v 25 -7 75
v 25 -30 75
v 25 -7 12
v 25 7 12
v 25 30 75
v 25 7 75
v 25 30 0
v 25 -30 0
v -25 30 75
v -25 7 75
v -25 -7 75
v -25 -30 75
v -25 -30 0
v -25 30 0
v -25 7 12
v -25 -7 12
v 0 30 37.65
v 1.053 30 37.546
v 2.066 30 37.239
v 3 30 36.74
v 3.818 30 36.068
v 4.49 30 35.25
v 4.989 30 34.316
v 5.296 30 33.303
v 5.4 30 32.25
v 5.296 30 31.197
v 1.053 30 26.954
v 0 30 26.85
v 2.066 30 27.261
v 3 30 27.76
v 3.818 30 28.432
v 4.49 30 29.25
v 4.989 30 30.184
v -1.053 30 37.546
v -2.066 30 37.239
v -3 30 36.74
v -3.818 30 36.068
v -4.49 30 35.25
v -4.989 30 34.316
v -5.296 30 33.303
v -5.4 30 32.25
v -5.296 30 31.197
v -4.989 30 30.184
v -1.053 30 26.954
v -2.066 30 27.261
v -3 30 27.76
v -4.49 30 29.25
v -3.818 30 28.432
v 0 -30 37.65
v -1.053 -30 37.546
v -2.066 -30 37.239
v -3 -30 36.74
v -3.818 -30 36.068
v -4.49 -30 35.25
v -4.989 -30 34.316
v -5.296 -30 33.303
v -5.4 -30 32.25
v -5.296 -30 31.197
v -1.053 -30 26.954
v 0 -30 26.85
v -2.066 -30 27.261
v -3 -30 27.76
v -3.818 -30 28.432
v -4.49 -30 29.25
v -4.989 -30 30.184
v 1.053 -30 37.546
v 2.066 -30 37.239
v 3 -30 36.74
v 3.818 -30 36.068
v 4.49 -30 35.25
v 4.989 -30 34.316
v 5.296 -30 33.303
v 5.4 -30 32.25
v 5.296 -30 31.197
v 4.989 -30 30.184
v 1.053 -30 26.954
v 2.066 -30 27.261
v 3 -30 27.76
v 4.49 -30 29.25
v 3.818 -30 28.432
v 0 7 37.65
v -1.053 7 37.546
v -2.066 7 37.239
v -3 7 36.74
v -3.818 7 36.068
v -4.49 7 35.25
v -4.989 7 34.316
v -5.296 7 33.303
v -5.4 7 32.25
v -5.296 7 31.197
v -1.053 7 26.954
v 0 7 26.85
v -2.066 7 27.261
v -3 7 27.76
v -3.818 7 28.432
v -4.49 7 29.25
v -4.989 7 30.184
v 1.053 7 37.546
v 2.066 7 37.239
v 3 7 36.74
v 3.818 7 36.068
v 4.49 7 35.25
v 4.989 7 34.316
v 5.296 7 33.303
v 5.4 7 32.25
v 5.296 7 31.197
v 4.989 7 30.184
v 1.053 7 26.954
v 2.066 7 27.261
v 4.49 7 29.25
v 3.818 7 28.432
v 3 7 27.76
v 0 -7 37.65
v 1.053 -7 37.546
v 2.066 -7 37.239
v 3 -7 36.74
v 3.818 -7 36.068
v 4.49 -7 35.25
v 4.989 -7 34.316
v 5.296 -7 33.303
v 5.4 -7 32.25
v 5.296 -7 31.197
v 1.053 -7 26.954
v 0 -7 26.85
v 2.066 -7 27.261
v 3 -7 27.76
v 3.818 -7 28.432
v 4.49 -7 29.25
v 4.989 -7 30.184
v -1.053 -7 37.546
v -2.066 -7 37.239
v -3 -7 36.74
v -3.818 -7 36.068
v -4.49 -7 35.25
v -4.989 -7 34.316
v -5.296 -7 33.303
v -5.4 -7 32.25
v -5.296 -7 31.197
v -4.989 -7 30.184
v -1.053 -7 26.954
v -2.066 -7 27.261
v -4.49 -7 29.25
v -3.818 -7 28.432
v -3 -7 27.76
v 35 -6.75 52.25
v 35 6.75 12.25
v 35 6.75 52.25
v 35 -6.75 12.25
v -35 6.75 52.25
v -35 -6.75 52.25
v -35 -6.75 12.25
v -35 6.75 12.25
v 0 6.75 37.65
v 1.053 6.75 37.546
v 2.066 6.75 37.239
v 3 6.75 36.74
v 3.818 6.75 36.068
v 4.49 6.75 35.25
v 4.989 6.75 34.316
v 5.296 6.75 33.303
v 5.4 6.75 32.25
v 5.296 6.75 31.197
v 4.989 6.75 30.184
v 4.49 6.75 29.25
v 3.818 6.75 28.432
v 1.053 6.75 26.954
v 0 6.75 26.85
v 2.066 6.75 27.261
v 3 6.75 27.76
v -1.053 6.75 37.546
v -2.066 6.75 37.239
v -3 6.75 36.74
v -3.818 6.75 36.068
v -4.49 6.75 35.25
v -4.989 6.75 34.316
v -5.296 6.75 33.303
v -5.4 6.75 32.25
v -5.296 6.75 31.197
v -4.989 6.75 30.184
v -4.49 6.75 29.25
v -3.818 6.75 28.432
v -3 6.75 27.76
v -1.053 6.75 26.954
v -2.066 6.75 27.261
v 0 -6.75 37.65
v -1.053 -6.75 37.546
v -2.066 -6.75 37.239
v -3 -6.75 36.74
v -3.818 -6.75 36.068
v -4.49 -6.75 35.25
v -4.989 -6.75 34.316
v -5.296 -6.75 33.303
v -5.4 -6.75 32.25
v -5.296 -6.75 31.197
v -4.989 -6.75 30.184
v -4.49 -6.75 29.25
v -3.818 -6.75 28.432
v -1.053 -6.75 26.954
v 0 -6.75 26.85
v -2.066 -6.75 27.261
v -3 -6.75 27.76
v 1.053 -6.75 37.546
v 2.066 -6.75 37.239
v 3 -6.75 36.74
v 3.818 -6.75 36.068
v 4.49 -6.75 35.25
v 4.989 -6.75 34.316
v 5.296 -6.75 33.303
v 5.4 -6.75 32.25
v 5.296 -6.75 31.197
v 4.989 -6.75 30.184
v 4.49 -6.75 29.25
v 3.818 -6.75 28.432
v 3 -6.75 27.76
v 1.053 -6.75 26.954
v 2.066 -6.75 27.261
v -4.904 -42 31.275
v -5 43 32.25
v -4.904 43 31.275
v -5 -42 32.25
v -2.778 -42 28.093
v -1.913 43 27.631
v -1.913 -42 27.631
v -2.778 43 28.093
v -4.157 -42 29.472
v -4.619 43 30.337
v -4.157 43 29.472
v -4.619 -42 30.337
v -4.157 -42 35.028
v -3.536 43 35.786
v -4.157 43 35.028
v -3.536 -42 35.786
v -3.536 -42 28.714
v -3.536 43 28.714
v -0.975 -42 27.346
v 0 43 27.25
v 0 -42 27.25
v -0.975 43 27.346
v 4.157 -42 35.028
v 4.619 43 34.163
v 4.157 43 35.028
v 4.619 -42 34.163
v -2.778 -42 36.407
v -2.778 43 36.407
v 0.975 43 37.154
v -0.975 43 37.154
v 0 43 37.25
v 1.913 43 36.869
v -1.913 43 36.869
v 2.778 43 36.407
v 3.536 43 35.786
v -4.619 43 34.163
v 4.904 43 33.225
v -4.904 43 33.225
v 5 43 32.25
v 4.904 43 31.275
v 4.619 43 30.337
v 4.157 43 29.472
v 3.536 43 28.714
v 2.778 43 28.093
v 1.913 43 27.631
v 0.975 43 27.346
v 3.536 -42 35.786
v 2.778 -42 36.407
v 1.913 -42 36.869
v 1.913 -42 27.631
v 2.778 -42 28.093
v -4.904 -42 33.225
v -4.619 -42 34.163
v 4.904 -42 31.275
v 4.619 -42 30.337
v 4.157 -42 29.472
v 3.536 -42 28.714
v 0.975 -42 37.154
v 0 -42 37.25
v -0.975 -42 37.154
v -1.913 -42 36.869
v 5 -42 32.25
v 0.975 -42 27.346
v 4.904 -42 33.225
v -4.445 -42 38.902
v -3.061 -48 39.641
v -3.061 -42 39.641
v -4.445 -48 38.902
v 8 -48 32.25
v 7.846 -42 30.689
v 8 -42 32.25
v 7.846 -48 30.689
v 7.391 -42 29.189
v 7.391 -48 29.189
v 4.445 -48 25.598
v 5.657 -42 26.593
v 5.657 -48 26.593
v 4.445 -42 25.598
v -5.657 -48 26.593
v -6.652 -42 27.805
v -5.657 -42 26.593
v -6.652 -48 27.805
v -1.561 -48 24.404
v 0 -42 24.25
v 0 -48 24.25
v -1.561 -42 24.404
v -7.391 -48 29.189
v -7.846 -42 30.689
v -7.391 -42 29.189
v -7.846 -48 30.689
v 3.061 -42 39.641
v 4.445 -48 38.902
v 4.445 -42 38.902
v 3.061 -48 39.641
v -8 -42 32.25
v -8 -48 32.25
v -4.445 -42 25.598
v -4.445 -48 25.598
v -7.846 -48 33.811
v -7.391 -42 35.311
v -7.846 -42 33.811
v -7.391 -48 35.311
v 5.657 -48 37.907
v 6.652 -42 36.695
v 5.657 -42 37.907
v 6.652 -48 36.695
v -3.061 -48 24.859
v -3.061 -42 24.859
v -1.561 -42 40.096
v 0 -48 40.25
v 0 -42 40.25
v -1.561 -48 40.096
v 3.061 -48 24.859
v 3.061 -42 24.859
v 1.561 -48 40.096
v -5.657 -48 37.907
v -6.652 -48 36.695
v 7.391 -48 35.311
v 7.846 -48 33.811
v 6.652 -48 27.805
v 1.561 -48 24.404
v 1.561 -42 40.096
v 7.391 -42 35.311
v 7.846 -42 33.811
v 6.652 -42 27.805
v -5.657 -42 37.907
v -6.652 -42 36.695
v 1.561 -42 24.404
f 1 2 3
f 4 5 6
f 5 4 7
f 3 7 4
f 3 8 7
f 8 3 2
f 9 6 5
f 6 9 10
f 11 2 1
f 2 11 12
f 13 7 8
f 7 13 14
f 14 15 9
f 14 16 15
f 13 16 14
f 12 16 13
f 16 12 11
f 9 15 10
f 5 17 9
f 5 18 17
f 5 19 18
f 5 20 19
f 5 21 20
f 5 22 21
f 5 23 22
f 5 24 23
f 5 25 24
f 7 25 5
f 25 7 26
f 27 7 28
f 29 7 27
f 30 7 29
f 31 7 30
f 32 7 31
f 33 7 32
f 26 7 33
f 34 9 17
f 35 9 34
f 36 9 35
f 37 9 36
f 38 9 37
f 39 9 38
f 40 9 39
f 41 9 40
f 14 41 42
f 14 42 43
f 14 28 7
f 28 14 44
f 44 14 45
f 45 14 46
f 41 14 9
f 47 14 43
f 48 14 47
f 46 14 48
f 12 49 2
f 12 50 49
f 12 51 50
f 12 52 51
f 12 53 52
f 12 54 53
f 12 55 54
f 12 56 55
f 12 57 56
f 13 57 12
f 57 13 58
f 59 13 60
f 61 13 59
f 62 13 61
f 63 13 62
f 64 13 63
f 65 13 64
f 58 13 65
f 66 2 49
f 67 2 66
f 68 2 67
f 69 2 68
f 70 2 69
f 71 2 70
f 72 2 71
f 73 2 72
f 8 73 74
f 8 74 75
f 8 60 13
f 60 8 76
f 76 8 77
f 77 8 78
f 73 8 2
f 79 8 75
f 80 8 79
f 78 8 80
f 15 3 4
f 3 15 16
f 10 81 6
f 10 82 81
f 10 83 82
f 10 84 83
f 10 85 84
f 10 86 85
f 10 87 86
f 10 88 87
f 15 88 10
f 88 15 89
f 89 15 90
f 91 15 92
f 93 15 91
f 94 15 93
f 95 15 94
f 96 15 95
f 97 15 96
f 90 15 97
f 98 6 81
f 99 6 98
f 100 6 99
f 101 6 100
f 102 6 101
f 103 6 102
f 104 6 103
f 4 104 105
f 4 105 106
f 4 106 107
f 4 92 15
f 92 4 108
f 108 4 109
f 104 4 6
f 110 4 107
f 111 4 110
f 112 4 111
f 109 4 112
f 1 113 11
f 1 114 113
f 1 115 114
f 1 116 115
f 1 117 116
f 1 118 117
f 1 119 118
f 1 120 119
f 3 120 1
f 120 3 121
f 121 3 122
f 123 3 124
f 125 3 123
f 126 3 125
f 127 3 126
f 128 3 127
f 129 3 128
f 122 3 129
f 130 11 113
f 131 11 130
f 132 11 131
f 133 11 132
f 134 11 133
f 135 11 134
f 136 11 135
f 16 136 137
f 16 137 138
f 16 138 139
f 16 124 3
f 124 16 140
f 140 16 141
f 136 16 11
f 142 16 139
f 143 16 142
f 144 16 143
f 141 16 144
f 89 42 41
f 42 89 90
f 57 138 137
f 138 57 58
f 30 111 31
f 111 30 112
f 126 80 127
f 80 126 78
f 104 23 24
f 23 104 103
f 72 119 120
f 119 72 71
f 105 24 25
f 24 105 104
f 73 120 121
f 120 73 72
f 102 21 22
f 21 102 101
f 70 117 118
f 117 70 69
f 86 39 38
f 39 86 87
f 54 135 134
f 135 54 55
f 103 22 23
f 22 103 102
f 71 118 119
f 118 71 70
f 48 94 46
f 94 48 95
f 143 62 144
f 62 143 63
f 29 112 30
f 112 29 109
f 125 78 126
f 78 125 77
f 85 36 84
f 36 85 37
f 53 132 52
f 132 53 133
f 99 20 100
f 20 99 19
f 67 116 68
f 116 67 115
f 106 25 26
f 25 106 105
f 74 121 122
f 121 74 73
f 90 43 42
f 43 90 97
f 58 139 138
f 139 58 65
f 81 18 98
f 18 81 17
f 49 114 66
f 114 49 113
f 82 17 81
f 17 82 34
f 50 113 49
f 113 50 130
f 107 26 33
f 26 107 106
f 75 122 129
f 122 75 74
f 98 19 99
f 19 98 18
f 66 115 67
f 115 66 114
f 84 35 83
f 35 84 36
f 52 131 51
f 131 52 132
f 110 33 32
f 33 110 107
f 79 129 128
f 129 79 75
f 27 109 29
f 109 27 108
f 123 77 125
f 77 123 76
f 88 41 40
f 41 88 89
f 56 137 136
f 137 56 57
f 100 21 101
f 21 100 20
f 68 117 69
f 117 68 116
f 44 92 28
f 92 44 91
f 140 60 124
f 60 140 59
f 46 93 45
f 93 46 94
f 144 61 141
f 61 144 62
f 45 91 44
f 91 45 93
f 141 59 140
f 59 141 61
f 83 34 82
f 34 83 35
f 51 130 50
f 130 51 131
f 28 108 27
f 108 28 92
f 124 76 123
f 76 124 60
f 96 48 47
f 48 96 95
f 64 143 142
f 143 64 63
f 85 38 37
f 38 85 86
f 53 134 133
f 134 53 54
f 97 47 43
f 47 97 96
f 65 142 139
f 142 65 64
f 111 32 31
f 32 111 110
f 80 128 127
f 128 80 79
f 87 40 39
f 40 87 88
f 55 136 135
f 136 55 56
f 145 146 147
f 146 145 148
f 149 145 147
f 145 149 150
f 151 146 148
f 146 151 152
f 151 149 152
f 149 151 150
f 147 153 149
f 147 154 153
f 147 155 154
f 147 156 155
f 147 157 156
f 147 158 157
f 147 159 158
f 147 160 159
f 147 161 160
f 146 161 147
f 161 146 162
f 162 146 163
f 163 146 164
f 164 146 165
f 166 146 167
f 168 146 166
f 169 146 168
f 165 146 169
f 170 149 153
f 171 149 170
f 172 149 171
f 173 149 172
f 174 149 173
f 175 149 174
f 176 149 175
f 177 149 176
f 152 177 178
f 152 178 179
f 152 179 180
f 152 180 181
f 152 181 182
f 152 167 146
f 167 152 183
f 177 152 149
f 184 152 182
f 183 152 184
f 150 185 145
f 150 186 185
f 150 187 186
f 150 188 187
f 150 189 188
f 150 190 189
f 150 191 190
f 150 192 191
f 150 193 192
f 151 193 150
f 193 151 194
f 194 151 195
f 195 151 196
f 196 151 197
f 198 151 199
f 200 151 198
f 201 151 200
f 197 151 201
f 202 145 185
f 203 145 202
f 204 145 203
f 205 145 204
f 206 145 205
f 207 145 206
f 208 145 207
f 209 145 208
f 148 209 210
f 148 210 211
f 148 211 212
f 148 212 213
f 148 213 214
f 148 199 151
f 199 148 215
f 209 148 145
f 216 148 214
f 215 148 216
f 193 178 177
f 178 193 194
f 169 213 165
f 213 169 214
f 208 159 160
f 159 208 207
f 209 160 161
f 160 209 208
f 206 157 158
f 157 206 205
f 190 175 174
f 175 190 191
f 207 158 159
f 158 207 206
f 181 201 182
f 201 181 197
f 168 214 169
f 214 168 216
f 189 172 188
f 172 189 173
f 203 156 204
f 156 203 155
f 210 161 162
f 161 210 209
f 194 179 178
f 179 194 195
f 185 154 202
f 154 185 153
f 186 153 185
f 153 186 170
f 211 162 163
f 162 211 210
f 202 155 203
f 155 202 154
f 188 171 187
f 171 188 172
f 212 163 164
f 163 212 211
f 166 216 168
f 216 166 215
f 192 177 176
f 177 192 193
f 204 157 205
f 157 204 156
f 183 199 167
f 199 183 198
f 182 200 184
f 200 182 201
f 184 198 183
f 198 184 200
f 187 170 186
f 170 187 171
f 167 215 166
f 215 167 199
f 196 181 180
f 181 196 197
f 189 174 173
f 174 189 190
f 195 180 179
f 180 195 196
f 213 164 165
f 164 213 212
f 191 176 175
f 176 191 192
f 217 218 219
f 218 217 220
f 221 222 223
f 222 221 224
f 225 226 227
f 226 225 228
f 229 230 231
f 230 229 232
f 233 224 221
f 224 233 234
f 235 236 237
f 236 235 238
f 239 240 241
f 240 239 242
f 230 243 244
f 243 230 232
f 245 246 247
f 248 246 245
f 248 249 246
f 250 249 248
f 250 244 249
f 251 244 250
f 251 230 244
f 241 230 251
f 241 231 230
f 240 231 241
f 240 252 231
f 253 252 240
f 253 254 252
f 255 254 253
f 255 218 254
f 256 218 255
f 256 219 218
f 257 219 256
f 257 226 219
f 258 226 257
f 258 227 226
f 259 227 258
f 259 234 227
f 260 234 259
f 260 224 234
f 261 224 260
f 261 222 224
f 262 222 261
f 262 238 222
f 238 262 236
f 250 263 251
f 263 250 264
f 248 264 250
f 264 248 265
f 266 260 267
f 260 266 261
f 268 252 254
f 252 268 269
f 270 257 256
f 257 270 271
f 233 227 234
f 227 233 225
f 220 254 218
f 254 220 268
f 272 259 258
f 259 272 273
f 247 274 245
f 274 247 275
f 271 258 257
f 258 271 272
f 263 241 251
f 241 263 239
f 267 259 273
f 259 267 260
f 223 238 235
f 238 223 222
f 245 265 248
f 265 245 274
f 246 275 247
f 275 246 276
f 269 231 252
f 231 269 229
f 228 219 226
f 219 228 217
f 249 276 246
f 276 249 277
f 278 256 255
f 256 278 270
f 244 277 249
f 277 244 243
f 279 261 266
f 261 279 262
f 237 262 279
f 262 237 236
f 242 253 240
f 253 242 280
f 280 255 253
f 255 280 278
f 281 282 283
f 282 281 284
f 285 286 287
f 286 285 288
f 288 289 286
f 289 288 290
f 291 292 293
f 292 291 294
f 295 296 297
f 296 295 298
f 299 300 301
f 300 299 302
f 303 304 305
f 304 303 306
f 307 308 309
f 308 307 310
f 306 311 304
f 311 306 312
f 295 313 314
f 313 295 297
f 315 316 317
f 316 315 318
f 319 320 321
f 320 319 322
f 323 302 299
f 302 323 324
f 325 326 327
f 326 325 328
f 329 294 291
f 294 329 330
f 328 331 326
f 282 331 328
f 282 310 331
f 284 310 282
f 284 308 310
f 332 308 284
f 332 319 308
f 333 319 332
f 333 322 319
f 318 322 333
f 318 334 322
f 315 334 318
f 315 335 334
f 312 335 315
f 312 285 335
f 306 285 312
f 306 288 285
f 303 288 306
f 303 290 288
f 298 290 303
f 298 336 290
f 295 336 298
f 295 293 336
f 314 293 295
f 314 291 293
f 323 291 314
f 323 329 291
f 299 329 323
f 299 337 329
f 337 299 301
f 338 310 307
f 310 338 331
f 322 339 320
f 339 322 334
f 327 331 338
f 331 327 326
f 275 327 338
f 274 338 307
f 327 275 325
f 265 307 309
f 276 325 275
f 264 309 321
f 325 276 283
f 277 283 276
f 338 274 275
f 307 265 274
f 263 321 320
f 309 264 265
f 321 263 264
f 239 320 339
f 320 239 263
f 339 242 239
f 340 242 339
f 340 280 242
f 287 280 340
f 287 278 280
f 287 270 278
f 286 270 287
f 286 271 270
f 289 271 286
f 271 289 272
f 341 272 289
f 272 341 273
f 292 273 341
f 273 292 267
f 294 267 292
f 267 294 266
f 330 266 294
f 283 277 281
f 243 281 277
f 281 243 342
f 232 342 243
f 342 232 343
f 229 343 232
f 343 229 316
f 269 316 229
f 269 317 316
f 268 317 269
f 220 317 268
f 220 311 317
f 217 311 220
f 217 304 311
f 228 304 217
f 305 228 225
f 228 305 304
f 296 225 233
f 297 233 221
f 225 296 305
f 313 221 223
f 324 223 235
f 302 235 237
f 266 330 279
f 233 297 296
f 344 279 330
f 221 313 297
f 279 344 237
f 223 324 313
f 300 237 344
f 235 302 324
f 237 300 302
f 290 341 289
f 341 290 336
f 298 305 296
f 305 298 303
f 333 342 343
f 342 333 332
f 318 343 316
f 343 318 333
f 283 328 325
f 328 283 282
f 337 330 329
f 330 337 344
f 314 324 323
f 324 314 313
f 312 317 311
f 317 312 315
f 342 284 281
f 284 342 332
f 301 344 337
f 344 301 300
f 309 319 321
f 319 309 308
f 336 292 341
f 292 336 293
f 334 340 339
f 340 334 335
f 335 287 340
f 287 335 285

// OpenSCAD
$fn = 32;

// ------------------------------------------------------------------------
// Clevis joint: 50 mm clevis, pin d10
// Every part is its own module, assembly() places them once.
// ------------------------------------------------------------------------

// --- part 1 ---
module clevis() {
  difference() {
    translate([-25, -30, 0]) cube([50, 60, 75]);
    translate([-26, -7, 12]) cube([52, 14, 64]);
    translate([0, 0, 32.25]) rotate([90, 0, 0]) cylinder(h = 62, d = 10.8, center = true);
  }
}

// --- part 2 ---
module eye() {
  difference() {
    translate([-35, -6.75, 0]) cube([70, 13.5, 40]);
    translate([0, 0, 20]) rotate([90, 0, 0]) cylinder(h = 15.5, d = 10.8, center = true);
  }
}

// --- part 3 ---
module pin() {
  rotate([0, 90, 0]) cylinder(h = 86, d = 10, center = true);
  translate([-48, 0, 0]) rotate([0, 90, 0]) cylinder(h = 6, d = 16);
}

// --- assembly ---
module assembly() {
  translate([0, 0, 0]) rotate([0, 0, 0]) clevis();
  translate([0, 0, 12.25]) rotate([0, 0, 0]) eye();
  translate([0, 0, 32.25]) rotate([0, 0, 90]) pin();
}

assembly();
